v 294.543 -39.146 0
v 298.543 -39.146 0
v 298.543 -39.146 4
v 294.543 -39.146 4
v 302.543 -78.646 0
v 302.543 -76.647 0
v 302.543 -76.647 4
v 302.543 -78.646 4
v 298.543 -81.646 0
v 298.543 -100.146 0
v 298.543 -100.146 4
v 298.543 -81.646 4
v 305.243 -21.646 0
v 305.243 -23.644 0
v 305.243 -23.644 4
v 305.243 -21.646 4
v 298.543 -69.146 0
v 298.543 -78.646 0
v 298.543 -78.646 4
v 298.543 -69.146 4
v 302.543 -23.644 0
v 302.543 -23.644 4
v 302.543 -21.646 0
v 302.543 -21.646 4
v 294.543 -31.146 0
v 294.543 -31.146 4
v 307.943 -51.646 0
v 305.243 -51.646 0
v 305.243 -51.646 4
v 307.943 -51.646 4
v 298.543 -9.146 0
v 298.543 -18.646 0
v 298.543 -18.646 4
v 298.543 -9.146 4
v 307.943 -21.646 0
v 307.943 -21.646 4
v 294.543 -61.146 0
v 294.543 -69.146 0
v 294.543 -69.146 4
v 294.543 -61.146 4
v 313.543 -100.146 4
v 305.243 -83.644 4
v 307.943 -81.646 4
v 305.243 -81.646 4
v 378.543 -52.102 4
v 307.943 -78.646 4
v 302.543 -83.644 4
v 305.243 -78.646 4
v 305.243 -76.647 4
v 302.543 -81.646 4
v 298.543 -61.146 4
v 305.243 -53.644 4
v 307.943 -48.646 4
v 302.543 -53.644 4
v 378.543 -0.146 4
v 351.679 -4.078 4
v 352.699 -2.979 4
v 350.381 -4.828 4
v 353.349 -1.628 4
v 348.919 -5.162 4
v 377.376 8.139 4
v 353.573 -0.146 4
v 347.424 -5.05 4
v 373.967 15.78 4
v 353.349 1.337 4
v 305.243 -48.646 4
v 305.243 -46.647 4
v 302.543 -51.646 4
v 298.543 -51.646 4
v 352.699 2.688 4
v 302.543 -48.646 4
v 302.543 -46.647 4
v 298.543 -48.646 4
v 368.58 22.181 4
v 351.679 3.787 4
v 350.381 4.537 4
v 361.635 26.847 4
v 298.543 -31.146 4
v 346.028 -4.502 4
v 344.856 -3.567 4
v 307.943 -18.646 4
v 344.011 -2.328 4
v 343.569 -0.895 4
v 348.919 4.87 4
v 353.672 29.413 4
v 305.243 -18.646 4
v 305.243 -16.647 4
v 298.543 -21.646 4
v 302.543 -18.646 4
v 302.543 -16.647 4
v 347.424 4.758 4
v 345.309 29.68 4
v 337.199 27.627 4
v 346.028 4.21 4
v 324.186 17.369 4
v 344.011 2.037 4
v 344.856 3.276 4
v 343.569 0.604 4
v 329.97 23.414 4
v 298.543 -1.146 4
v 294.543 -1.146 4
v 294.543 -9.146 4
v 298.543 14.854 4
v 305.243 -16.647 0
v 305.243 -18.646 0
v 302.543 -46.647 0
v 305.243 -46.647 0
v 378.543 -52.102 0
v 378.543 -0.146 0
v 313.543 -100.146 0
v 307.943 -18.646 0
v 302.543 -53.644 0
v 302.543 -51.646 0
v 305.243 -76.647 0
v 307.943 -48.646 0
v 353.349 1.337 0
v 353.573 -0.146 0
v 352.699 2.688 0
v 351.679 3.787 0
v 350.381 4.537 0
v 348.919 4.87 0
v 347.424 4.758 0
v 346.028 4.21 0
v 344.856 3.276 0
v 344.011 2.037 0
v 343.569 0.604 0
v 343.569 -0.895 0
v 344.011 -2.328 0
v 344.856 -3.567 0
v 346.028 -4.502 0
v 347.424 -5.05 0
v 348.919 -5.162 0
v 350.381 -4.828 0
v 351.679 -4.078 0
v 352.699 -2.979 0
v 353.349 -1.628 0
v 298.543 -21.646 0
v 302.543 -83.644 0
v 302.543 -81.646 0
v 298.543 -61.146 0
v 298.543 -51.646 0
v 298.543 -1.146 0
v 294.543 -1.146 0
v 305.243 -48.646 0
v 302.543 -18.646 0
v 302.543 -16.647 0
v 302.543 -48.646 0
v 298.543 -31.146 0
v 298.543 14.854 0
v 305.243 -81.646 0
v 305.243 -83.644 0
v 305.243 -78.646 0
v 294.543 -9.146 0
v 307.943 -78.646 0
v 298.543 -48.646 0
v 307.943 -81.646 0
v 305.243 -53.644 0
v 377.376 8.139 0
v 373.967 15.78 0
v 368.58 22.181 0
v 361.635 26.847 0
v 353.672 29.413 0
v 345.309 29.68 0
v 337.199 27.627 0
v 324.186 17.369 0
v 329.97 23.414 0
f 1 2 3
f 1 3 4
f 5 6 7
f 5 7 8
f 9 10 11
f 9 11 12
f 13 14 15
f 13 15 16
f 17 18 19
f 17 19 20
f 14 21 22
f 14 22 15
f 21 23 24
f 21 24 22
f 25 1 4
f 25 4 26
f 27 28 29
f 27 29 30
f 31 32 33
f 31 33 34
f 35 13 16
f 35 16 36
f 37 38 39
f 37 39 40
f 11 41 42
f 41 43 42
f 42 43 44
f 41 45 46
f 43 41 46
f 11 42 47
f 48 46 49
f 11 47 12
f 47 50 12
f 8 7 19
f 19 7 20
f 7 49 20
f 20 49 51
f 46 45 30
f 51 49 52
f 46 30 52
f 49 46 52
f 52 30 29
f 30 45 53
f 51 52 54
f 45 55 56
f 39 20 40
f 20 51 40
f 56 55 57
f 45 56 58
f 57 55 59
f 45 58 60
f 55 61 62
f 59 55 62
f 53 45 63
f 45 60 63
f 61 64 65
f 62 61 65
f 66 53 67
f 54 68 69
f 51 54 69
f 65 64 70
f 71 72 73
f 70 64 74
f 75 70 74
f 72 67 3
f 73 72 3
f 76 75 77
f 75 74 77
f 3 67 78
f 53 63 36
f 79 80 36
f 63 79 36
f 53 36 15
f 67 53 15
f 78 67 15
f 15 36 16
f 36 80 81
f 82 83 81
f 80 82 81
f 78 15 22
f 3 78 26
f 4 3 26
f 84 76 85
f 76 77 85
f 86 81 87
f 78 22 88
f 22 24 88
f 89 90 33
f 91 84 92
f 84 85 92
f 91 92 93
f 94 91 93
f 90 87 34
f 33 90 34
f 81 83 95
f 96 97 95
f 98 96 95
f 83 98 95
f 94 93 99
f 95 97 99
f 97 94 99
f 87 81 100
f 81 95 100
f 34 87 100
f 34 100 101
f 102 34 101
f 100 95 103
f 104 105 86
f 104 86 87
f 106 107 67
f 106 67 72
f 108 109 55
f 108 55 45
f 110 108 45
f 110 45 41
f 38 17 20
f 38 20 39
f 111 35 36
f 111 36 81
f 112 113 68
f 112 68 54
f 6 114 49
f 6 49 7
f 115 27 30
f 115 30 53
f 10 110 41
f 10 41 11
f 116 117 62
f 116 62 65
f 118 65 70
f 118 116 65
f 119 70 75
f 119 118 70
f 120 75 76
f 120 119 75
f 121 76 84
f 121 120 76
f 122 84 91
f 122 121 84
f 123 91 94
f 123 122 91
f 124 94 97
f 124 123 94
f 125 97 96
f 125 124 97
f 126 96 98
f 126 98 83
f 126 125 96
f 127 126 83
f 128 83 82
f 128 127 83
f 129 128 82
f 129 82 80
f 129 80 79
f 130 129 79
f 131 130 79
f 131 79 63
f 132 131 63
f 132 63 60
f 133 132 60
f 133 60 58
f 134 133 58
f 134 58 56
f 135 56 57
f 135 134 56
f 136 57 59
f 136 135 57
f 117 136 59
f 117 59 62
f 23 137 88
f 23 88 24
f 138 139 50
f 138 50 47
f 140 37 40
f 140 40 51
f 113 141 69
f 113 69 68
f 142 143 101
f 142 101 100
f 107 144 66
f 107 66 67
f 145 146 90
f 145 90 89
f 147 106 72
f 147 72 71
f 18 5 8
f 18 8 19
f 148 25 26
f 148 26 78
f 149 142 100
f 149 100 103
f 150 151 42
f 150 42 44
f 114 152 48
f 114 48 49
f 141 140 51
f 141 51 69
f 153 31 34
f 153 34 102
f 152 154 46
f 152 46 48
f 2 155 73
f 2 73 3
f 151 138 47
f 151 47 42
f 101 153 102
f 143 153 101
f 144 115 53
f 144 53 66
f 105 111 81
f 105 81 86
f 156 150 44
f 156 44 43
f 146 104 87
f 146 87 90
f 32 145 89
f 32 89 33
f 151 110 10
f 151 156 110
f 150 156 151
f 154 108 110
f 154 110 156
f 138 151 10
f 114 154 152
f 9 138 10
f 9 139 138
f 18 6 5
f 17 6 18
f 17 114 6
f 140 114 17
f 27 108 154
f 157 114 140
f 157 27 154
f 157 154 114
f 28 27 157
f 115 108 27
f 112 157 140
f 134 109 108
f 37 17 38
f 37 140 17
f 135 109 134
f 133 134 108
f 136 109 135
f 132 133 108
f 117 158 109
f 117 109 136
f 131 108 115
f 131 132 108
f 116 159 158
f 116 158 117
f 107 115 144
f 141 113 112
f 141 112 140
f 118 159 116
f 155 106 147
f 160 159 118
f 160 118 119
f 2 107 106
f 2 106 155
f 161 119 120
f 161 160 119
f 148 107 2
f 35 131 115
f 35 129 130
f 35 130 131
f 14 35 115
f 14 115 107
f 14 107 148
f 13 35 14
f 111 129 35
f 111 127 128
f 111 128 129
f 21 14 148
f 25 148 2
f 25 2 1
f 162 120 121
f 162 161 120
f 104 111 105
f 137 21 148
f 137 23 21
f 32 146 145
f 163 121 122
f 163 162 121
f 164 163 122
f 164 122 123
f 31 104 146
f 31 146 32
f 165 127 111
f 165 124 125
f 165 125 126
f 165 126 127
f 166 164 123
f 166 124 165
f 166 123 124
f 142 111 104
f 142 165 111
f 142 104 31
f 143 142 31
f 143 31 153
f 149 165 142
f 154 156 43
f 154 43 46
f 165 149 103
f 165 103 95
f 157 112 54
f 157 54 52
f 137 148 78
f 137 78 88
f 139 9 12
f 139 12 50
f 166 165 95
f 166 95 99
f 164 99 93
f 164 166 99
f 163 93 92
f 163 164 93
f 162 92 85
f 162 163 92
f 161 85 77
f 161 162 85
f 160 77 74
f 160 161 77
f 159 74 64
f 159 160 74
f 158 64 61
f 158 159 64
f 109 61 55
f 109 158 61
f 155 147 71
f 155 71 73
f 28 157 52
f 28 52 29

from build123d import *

# Parameters (mm, degrees)
SKETCH_1_R      = 5.03
EXTRUDE_1_DEPTH = 4


with BuildPart() as part:
    # 草图1 → 凸台-拉伸1 (new body)
    with BuildSketch(Plane.XY):
        with BuildLine():
            Line((298.542857143, -51.645714286), (302.542857143, -51.645714286))
            Line((302.542857143, -51.645714286), (302.542857143, -53.644175919))
            Line((302.542857143, -53.644175919), (305.242857143, -53.644175919))
            Line((305.242857143, -53.644175919), (305.242857143, -51.645714286))
            Line((305.242857143, -51.645714286), (307.942857143, -51.645714286))
            Line((307.942857143, -51.645714286), (307.942857143, -48.645714286))
            Line((307.942857143, -48.645714286), (305.242857143, -48.645714286))
            Line((305.242857143, -48.645714286), (305.242857143, -46.647252653))
            Line((305.242857143, -46.647252653), (302.542857143, -46.647252653))
            Line((302.542857143, -46.647252653), (302.542857143, -48.645714286))
            Line((302.542857143, -48.645714286), (298.542857143, -48.645714286))
            Line((298.542857143, -48.645714286), (298.542857143, -39.145714286))
            Line((298.542857143, -39.145714286), (294.542857143, -39.145714286))
            Line((294.542857143, -39.145714286), (294.542857143, -31.145714286))
            Line((294.542857143, -31.145714286), (298.542857143, -31.145714286))
            Line((298.542857143, -31.145714286), (298.542857143, -21.645714286))
            Line((298.542857143, -21.645714286), (302.542857143, -21.645714286))
            Line((302.542857143, -21.645714286), (302.542857143, -23.644175919))
            Line((302.542857143, -23.644175919), (305.242857143, -23.644175919))
            Line((305.242857143, -23.644175919), (305.242857143, -21.645714286))
            Line((305.242857143, -21.645714286), (307.942857143, -21.645714286))
            Line((307.942857143, -21.645714286), (307.942857143, -18.645714286))
            Line((307.942857143, -18.645714286), (305.242857143, -18.645714286))
            Line((305.242857143, -18.645714286), (305.242857143, -16.647252653))
            Line((305.242857143, -16.647252653), (302.542857143, -16.647252653))
            Line((302.542857143, -16.647252653), (302.542857143, -18.645714286))
            Line((302.542857143, -18.645714286), (298.542857143, -18.645714286))
            Line((298.542857143, -18.645714286), (298.542857143, -9.145714286))
            Line((298.542857143, -9.145714286), (294.542857143, -9.145714286))
            Line((294.542857143, -9.145714286), (294.542857143, -1.145714286))
            Line((294.542857143, -1.145714286), (298.542857143, -1.145714286))
            Line((298.542857143, -1.145714286), (298.542857143, -0.145714286))
            Line((298.542857143, -0.145714286), (298.542857143, 14.854285714))
            Line((298.542857143, 14.854285714), (324.186090726, 17.3685065))
            ThreePointArc((324.186090726, 17.3685065), (357.743319291, 28.408646086), (378.542857143, -0.145714286))
            Line((378.542857143, -0.145714286), (378.542857143, -52.102236025))
            Line((378.542857143, -52.102236025), (313.542857143, -100.145714286))
            Line((313.542857143, -100.145714286), (298.542857143, -100.145714286))
            Line((298.542857143, -100.145714286), (298.542857143, -81.645714286))
            Line((298.542857143, -81.645714286), (302.542857143, -81.645714286))
            Line((302.542857143, -81.645714286), (302.542857143, -83.644175919))
            Line((302.542857143, -83.644175919), (305.242857143, -83.644175919))
            Line((305.242857143, -83.644175919), (305.242857143, -81.645714286))
            Line((305.242857143, -81.645714286), (307.942857143, -81.645714286))
            Line((307.942857143, -81.645714286), (307.942857143, -78.645714286))
            Line((307.942857143, -78.645714286), (305.242857143, -78.645714286))
            Line((305.242857143, -78.645714286), (305.242857143, -76.647252653))
            Line((305.242857143, -76.647252653), (302.542857143, -76.647252653))
            Line((302.542857143, -76.647252653), (302.542857143, -78.645714286))
            Line((302.542857143, -78.645714286), (298.542857143, -78.645714286))
            Line((298.542857143, -78.645714286), (298.542857143, -69.145714286))
            Line((298.542857143, -69.145714286), (294.542857143, -69.145714286))
            Line((294.542857143, -69.145714286), (294.542857143, -61.145714286))
            Line((294.542857143, -61.145714286), (298.542857143, -61.145714286))
            Line((298.542857143, -61.145714286), (298.542857143, -51.645714286))
        make_face()
        with Locations((348.542857143, -0.145714286)):
            Circle(SKETCH_1_R, mode=Mode.SUBTRACT)
    extrude(amount=EXTRUDE_1_DEPTH)


solid = part.part
